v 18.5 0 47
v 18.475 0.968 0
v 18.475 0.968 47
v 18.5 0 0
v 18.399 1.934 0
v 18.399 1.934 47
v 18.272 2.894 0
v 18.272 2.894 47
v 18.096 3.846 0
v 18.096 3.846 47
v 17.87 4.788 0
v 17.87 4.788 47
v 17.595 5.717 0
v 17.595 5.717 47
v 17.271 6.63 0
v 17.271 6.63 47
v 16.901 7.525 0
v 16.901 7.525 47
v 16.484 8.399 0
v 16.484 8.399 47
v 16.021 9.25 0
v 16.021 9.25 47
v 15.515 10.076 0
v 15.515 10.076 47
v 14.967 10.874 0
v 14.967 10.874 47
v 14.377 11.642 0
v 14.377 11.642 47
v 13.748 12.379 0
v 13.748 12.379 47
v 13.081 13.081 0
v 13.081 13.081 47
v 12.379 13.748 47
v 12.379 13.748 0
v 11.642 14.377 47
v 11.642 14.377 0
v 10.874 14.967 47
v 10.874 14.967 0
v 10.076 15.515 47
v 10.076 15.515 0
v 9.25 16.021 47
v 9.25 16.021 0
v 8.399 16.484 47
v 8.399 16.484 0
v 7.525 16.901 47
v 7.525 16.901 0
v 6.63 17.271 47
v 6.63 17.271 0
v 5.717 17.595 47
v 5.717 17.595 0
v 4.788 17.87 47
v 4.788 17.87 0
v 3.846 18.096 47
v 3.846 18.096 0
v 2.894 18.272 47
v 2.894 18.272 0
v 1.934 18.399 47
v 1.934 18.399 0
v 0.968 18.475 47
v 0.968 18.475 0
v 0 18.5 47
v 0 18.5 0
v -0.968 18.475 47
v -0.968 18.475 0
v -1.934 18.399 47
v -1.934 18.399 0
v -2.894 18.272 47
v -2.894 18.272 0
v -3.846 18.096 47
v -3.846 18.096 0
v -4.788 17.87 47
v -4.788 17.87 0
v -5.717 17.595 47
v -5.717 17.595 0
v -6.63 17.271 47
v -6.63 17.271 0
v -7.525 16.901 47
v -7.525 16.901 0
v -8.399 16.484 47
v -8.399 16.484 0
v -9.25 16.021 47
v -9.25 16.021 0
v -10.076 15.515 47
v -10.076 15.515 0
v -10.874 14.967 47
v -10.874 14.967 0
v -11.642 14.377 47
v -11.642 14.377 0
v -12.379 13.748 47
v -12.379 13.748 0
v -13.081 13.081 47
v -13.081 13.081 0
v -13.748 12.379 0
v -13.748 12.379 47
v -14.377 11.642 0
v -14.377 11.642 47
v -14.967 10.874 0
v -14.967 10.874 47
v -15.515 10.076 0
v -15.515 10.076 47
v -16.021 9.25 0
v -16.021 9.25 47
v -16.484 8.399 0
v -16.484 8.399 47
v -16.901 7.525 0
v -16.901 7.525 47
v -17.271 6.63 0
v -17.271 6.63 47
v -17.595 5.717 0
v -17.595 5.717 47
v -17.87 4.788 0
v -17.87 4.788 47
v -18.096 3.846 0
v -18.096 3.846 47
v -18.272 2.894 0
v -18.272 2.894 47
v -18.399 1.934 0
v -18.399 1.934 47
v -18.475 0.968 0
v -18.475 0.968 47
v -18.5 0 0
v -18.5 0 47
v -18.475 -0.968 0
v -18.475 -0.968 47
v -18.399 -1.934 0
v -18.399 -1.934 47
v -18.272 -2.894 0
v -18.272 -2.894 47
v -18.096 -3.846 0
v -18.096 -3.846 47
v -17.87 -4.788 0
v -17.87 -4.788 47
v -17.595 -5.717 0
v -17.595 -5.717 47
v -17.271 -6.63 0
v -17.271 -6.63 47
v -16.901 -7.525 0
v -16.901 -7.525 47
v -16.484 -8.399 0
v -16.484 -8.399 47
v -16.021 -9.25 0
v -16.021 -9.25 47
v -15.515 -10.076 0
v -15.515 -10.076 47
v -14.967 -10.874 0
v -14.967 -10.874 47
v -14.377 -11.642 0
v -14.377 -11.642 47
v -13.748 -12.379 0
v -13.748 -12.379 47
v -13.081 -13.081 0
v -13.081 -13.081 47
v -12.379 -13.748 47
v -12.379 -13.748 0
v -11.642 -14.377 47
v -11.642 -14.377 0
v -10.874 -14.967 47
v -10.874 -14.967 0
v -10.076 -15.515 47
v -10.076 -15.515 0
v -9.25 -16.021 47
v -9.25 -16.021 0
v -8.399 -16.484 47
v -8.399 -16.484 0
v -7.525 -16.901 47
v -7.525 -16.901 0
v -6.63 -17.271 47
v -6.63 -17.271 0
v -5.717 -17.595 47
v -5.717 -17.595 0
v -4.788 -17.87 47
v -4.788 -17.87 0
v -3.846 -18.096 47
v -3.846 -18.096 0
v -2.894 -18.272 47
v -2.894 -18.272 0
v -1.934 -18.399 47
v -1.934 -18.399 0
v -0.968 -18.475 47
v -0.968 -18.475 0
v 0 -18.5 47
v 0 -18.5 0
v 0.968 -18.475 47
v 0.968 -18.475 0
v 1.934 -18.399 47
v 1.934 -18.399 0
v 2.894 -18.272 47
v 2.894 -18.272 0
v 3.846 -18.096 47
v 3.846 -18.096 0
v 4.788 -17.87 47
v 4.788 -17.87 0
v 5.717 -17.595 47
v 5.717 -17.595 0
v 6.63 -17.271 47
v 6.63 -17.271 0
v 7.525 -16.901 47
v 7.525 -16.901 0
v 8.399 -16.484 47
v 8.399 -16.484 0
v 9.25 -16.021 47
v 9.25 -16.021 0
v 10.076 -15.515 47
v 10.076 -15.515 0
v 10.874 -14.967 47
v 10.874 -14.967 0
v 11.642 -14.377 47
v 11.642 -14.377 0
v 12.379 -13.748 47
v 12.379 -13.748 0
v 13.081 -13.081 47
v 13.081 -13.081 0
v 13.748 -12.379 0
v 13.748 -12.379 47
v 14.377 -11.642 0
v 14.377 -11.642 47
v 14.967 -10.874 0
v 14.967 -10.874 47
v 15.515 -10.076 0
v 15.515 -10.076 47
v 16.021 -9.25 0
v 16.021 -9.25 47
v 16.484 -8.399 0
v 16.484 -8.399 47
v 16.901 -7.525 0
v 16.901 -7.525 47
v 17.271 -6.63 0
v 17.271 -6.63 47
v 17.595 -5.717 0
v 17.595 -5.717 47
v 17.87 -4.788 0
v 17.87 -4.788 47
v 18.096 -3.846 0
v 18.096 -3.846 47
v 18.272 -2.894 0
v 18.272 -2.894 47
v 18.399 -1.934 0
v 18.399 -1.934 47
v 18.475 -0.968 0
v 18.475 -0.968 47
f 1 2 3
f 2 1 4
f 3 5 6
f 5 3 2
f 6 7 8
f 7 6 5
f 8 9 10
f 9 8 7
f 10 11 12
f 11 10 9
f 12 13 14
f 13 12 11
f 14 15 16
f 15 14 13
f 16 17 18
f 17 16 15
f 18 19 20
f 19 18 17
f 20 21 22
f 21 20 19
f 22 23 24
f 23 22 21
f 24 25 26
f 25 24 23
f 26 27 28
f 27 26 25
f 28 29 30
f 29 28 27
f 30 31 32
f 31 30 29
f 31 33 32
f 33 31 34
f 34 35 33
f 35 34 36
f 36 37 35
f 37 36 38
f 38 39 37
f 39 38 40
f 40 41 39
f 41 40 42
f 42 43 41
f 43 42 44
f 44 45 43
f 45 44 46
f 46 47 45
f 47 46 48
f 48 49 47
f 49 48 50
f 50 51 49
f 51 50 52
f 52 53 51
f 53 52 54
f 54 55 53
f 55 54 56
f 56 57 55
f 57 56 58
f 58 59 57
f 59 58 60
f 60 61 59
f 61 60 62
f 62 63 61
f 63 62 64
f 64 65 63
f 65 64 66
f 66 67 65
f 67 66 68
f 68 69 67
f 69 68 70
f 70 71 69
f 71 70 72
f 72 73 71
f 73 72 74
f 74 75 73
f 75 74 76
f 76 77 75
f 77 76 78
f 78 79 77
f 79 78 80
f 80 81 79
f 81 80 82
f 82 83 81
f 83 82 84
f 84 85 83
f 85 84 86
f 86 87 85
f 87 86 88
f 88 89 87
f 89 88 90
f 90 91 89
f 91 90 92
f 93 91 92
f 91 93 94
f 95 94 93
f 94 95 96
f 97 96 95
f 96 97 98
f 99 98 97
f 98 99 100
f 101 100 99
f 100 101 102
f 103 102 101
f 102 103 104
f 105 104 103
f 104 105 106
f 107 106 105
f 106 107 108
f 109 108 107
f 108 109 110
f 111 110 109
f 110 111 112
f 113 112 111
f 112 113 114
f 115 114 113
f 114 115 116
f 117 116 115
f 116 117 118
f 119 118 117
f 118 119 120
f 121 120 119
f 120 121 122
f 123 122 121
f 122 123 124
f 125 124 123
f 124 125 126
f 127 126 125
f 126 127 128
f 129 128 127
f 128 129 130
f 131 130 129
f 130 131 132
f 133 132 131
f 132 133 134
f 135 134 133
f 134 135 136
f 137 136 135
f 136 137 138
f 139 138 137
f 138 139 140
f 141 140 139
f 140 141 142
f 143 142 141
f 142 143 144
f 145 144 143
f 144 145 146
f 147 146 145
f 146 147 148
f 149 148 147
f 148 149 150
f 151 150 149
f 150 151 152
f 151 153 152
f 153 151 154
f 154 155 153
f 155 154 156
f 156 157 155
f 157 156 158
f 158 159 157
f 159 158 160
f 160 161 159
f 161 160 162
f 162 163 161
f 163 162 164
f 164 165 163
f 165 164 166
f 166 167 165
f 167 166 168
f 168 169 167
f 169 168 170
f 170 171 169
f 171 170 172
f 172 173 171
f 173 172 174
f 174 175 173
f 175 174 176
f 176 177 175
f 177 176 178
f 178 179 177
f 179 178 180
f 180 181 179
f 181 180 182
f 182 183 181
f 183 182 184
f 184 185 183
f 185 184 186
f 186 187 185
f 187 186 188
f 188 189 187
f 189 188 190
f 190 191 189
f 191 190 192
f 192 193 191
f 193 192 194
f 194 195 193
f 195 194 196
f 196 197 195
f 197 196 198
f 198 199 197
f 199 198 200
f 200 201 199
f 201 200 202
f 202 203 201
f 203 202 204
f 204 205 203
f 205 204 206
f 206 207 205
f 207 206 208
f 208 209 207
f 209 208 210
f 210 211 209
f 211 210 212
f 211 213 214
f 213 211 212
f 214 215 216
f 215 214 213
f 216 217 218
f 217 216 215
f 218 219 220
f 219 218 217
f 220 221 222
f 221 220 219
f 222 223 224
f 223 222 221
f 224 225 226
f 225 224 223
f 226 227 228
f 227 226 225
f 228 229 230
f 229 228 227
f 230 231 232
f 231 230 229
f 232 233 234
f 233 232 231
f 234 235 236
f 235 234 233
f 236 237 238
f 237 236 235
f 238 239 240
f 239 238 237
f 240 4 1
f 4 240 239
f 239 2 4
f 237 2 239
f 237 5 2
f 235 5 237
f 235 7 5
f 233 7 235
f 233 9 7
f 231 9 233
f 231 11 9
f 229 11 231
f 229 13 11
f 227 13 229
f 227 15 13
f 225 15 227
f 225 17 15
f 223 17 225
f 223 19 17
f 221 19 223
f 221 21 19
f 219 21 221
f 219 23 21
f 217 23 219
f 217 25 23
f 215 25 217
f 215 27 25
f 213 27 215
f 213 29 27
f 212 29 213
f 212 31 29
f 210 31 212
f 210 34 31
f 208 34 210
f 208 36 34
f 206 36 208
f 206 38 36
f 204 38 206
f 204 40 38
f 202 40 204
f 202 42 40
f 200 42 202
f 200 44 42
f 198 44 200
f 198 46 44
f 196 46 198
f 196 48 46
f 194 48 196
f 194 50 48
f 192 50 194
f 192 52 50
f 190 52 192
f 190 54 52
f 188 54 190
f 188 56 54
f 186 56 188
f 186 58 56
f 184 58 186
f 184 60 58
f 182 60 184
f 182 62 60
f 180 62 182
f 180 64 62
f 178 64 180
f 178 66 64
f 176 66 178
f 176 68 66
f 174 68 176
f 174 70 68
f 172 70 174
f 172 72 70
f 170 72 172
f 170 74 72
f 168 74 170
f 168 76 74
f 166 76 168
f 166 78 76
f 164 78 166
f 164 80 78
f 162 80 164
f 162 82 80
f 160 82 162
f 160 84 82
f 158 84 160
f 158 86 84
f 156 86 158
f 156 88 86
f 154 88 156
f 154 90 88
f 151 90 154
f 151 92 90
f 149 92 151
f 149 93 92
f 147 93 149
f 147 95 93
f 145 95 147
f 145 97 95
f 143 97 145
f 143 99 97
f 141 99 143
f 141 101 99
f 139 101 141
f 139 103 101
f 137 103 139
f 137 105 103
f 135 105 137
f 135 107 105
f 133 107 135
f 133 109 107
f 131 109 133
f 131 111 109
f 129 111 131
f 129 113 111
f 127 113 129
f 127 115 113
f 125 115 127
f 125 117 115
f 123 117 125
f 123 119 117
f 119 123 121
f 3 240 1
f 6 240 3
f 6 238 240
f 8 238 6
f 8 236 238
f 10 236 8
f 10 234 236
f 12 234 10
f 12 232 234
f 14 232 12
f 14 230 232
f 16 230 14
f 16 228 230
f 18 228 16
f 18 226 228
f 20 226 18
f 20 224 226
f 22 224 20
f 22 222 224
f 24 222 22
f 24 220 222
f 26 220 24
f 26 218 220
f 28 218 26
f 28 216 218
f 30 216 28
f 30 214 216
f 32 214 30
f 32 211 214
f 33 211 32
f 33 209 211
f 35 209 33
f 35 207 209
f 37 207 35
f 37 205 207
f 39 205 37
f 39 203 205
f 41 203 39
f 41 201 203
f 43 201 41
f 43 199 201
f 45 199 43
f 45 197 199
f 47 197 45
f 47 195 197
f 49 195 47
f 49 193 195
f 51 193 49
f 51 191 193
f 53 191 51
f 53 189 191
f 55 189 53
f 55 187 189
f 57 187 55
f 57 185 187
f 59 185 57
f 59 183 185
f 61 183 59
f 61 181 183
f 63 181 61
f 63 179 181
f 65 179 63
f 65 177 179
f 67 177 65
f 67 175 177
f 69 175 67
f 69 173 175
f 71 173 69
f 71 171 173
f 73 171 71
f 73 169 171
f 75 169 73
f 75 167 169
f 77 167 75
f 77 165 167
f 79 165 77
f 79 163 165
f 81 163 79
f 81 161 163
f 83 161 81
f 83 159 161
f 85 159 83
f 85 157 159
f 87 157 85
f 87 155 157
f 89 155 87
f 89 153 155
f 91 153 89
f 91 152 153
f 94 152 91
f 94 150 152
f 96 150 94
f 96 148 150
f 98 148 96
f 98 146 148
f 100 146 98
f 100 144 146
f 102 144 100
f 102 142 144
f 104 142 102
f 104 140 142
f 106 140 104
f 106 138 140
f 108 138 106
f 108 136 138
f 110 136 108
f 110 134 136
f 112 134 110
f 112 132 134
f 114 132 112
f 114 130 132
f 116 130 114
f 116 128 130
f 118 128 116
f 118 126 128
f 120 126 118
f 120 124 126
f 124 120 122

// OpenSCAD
height = 47;
r = (37 / 2);

cylinder(h = height, r = r, $fn = 120);
